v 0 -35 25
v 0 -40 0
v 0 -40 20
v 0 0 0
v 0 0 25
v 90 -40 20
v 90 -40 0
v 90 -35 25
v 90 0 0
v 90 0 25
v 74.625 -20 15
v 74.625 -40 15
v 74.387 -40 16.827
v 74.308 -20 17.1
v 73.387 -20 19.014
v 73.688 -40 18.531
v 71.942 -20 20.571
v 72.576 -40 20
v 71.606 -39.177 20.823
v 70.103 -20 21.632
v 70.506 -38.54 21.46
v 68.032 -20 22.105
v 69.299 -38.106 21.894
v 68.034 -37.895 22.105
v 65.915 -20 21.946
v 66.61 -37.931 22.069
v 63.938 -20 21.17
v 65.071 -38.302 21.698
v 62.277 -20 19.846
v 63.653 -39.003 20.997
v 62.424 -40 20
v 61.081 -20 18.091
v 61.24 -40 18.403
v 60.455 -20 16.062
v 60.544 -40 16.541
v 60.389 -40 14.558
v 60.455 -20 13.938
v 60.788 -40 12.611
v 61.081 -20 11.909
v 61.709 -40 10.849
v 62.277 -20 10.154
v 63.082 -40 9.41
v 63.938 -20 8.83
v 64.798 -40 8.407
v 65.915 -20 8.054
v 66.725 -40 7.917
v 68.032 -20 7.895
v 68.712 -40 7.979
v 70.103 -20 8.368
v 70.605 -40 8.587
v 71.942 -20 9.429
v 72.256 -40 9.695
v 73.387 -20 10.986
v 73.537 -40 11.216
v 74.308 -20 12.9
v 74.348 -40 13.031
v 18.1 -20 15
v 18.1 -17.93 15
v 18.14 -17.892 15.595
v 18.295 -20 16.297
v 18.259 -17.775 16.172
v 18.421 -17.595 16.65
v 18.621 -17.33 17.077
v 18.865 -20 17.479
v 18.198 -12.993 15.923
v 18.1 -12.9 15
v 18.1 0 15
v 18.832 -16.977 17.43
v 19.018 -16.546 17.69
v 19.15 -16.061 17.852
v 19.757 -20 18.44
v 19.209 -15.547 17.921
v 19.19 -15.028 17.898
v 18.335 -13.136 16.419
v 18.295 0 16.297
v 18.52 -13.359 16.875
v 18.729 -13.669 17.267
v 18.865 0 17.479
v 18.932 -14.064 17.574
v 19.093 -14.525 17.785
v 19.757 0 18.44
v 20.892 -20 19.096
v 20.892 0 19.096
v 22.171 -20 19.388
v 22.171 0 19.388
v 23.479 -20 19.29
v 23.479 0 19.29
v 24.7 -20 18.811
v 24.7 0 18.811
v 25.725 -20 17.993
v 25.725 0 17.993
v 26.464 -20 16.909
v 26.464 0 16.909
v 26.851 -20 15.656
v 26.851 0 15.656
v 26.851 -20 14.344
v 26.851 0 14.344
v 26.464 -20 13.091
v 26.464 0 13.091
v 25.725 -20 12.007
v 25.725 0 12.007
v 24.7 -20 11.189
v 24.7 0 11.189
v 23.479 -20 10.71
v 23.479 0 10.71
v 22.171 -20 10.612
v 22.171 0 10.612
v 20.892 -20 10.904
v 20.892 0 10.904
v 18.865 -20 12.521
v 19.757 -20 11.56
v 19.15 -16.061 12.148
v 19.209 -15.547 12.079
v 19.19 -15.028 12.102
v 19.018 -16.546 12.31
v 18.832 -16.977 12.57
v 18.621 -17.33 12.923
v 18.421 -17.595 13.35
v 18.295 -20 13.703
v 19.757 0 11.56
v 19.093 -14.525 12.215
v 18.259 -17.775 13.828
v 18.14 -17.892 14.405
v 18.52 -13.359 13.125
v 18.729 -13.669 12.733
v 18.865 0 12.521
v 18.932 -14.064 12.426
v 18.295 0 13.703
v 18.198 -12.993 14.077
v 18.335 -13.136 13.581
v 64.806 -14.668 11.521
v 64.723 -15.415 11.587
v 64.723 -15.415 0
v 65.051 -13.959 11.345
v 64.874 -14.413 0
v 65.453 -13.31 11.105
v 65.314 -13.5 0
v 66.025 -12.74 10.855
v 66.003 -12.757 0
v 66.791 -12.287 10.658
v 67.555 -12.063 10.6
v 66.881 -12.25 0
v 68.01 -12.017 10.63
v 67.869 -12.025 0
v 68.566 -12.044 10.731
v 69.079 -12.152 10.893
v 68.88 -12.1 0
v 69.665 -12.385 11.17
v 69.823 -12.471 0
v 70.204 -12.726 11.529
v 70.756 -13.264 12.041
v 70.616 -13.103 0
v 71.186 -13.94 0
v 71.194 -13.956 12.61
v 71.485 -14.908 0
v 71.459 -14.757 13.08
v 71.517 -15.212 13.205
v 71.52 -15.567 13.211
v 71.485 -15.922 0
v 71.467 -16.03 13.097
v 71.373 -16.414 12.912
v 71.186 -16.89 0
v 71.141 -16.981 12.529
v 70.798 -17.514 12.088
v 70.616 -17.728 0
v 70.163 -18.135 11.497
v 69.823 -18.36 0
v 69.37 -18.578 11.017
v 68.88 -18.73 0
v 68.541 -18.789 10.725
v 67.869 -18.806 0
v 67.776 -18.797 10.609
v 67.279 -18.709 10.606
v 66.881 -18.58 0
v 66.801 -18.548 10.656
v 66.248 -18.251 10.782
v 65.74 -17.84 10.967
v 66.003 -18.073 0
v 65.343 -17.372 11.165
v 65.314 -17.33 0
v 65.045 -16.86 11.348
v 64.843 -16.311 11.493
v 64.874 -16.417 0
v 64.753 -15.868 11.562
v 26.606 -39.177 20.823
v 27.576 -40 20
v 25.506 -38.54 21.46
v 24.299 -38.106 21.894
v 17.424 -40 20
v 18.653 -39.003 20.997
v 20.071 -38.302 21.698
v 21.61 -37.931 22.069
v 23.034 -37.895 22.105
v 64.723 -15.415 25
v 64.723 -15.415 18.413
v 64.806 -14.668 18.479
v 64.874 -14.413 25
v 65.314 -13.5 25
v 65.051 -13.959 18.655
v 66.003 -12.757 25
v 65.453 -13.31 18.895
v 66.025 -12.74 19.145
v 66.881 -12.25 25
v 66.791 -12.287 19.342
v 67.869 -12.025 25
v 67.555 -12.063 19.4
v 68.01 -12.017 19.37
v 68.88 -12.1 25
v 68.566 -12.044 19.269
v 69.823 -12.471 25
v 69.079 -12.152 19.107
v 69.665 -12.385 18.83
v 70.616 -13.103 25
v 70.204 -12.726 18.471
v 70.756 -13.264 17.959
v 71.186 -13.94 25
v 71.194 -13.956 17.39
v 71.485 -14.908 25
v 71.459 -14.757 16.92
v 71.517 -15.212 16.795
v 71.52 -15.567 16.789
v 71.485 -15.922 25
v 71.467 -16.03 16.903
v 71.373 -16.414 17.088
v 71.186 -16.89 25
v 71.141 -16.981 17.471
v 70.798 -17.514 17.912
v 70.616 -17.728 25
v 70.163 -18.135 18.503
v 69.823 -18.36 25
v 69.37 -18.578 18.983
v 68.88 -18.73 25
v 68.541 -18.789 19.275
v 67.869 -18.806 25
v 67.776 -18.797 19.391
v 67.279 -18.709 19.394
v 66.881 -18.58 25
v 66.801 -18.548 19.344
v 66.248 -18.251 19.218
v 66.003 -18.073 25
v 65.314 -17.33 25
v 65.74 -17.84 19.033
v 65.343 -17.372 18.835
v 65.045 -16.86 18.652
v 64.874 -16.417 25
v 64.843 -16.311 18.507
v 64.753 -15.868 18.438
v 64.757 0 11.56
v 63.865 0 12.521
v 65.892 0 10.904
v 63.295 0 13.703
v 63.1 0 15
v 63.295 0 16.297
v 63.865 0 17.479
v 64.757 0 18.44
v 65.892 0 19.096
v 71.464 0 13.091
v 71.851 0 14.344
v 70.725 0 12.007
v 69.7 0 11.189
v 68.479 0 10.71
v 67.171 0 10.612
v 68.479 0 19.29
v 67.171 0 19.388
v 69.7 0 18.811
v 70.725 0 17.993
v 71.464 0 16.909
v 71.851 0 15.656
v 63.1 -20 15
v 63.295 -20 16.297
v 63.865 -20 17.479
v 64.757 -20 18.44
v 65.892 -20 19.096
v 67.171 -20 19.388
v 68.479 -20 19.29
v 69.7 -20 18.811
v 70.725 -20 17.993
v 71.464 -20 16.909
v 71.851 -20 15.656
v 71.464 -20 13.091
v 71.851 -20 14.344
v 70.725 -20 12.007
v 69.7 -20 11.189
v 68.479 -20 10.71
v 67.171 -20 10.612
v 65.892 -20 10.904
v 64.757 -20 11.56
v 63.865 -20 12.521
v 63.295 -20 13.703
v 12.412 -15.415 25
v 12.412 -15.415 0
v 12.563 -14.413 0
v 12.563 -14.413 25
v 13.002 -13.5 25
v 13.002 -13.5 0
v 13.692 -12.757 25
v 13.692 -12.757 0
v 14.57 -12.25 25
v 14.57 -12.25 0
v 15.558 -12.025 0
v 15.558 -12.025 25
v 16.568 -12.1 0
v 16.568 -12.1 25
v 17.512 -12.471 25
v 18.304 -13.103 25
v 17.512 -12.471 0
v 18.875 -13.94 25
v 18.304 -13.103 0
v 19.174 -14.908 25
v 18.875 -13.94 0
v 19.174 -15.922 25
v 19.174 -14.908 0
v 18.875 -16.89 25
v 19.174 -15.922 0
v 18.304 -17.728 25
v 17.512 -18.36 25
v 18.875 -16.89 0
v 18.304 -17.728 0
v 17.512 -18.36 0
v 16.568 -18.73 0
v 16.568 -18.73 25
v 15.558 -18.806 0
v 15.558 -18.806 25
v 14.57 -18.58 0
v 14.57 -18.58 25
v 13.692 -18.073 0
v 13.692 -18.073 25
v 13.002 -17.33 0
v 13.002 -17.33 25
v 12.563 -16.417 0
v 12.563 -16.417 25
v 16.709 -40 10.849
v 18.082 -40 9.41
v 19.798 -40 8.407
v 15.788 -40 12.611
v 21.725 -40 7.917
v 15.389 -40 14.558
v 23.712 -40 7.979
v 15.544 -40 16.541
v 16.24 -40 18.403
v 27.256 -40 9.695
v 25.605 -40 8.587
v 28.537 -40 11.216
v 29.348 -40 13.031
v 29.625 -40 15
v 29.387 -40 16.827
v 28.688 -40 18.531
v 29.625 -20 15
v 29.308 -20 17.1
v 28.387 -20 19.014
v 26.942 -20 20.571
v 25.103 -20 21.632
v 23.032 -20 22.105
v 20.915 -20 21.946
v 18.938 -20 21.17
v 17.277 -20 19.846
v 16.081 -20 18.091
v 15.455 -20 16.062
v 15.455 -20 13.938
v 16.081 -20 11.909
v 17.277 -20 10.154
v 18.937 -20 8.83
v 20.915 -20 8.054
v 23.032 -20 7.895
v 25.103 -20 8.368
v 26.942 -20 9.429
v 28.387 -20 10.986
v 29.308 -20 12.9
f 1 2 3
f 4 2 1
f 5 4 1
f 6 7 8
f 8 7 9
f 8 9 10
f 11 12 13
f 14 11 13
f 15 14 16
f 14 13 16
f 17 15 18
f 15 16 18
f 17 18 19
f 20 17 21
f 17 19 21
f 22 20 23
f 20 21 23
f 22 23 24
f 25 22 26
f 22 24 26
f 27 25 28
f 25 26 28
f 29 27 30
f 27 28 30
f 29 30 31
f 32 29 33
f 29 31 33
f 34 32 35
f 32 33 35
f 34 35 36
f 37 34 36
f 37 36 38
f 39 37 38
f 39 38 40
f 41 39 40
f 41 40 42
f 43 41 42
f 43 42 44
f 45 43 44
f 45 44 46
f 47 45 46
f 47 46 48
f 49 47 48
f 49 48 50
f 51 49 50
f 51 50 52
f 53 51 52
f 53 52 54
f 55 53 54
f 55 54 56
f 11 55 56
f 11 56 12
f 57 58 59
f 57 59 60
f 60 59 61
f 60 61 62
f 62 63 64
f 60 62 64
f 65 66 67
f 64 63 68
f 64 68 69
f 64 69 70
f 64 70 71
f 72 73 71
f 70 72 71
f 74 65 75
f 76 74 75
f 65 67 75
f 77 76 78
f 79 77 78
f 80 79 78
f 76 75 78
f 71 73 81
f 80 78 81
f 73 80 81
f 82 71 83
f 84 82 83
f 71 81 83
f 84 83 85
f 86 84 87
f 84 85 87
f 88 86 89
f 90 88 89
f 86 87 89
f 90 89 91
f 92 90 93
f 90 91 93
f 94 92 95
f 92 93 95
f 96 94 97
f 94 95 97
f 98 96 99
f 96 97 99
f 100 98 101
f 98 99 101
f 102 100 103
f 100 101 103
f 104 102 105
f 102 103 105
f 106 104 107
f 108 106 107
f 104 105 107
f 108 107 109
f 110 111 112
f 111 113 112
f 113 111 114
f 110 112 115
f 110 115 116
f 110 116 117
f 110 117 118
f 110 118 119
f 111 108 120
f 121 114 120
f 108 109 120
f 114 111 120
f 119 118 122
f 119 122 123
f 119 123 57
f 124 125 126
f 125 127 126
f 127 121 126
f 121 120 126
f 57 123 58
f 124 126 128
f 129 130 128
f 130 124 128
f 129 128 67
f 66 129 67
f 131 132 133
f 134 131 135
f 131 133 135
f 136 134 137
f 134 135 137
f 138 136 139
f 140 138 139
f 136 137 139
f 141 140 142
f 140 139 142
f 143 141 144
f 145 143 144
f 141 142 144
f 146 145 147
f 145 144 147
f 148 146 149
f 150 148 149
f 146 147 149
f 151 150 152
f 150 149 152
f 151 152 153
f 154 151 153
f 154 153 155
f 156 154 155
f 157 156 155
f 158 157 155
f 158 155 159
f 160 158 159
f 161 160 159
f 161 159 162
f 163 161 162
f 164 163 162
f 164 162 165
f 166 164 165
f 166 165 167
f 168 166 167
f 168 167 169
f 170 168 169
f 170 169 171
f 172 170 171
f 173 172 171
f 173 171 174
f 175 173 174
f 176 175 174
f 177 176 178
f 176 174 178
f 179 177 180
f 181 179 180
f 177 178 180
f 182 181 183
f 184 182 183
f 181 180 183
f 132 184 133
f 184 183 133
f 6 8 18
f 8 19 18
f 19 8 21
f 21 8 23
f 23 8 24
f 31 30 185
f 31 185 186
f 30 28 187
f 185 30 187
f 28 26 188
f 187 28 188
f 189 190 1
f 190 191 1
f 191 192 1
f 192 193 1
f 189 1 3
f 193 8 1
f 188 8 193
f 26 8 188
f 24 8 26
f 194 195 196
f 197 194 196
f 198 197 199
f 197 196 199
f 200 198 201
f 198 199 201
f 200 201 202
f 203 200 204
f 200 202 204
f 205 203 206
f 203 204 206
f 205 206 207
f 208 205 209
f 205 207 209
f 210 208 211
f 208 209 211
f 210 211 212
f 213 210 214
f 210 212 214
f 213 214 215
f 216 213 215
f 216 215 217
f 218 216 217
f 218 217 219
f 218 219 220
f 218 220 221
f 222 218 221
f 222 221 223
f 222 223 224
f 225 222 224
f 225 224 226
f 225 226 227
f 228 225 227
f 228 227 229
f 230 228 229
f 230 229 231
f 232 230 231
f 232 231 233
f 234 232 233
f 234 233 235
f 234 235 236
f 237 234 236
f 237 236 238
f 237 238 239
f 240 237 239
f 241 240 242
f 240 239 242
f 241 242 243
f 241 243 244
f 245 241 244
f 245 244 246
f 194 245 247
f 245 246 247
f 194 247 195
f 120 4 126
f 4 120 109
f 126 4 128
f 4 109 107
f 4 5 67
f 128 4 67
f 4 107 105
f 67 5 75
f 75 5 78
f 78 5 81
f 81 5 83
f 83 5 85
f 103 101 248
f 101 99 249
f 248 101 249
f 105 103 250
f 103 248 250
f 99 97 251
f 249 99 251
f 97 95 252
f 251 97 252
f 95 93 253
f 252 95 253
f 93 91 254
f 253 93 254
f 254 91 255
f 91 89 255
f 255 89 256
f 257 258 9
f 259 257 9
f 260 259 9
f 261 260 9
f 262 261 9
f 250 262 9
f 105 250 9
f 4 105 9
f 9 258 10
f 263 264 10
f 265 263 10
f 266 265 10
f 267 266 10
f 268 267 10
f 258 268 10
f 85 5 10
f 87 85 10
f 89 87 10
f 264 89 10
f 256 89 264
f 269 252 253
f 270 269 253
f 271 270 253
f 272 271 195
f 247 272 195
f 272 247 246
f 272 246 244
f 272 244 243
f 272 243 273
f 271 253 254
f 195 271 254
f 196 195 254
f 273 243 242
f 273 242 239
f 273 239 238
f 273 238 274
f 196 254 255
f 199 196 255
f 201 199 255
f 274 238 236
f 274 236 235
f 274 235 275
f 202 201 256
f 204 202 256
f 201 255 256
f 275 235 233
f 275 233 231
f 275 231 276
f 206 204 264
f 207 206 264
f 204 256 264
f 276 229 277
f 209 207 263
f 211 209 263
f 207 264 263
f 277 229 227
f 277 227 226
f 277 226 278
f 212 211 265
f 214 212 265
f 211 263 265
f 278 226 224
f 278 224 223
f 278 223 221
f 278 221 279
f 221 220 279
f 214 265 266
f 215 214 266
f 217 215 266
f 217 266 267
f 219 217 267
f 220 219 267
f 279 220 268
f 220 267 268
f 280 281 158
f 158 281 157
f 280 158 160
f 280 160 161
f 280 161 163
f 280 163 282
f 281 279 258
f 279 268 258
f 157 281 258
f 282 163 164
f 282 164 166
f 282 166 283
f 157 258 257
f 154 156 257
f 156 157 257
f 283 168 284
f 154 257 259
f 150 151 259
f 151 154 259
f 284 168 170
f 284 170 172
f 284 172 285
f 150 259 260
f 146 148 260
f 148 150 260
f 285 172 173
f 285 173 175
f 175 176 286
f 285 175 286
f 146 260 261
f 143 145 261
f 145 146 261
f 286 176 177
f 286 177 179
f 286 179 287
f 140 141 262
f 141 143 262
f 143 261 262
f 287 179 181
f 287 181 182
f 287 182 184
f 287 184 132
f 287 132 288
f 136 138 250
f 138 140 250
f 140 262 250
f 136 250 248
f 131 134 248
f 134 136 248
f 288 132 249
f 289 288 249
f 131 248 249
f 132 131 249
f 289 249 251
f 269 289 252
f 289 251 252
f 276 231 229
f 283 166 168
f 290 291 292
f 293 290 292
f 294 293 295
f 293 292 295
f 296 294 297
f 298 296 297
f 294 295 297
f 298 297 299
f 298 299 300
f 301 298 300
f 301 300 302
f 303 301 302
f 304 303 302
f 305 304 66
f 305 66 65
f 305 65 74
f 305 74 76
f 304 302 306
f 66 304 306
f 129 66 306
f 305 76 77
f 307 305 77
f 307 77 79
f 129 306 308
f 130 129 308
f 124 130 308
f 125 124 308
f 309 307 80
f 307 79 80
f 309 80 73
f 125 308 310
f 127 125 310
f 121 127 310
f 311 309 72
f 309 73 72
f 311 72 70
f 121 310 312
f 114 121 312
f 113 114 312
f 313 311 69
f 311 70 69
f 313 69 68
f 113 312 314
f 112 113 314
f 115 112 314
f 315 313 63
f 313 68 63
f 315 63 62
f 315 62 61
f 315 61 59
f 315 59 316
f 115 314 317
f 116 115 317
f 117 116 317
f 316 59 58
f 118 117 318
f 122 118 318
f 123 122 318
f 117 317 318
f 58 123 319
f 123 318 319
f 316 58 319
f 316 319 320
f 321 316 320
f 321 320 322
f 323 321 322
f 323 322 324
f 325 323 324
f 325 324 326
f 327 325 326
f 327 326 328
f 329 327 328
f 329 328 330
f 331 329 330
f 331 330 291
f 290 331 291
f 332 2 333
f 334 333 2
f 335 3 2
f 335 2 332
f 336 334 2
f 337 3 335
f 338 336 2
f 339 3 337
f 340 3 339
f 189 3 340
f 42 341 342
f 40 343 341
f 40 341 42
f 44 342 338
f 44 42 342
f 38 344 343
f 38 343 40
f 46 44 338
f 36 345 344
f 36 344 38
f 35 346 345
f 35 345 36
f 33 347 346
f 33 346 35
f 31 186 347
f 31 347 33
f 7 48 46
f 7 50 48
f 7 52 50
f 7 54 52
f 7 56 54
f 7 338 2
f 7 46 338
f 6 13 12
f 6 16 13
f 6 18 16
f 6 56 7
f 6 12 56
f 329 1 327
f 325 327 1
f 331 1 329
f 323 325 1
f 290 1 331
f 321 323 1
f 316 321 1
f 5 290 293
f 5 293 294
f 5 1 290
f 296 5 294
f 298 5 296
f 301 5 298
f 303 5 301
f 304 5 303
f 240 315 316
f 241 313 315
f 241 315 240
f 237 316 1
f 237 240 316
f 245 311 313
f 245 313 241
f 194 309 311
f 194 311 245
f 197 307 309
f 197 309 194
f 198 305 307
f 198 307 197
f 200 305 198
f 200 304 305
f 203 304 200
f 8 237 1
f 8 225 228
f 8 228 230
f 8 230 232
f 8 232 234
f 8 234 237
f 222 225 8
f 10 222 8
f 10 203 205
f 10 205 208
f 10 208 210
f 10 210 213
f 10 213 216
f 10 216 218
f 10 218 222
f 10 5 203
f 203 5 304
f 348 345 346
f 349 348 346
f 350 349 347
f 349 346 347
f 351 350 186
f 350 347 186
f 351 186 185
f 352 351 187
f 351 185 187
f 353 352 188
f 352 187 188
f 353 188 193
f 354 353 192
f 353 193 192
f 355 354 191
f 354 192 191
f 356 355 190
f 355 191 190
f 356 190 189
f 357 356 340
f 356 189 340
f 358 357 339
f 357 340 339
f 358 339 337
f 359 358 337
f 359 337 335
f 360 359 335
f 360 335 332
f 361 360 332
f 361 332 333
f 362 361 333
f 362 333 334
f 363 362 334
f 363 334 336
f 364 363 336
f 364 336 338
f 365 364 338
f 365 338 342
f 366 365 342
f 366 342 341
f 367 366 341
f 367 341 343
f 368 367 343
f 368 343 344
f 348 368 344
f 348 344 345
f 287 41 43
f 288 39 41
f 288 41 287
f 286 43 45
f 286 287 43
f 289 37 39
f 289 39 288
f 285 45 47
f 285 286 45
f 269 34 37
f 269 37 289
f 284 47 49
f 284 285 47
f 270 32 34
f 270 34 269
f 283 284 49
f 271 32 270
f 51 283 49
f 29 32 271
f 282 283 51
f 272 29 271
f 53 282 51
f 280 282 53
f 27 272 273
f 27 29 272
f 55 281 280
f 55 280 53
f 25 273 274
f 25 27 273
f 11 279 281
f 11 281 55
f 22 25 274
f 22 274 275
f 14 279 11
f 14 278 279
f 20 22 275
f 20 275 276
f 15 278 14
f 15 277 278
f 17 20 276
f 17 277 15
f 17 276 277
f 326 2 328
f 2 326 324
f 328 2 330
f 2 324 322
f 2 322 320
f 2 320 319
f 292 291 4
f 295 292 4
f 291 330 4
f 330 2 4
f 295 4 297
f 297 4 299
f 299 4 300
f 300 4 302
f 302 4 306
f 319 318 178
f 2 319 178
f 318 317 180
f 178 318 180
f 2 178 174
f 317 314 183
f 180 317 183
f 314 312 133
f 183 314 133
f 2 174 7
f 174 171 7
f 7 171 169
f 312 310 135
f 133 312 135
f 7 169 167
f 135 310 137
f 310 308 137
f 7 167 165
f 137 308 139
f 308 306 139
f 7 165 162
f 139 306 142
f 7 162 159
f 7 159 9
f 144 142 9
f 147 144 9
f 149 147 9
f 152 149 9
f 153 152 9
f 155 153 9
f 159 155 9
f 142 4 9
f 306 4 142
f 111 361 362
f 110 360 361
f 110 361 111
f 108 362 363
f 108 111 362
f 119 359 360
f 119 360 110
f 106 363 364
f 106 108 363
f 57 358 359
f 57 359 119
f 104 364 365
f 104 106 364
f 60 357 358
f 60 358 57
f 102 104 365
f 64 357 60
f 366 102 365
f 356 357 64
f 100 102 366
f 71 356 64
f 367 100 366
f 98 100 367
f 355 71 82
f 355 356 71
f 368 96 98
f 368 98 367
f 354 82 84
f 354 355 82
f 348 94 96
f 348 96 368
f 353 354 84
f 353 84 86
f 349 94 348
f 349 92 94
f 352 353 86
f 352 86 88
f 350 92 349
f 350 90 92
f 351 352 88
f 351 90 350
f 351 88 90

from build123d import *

# Parameters (mm, degrees)
F0_W           = 90
F0_H           = 25
F1_DEPTH       = 40
F3_D           = 8.8
F3_CBORE_D     = 14.25
F3_CBORE_DEPTH = 20
F4_T1_DEPTH    = 115.7168298797
F6_D           = 6.8


# Not quite as in the source:
# - a fillet or chamfer that OpenCascade refuses, or shapes differently, is made with other operations: its cross-section is extruded or revolved along the edge and cut away or added


with BuildPart() as f1:
    # F0 (on Front) → F1 (new body)
    with BuildSketch(Plane.XZ):
        with Locations((45, 12.5)):
            Rectangle(F0_W, F0_H)
    extrude(amount=F1_DEPTH)

    # F3 (through all)
    with Locations(Plane.XZ.offset(40)):
        with Locations((22.5, 15), (67.5, 15)):
            CounterBoreHole(F3_D / 2, F3_CBORE_D / 2, F3_CBORE_DEPTH)

    # F4: chamfer of 5 on 1 edges, made by hand

    # F4_s2 → F4_t1 (cut)
    with BuildSketch(Plane.YZ.offset(-12.8584149398)):
        Polygon((-35, 25), (-40, 20), (-40, 25), align=None)
    extrude(amount=F4_T1_DEPTH, mode=Mode.SUBTRACT)

    # F6 (through all)
    with Locations(Plane.XY.offset(25)):
        with Locations((15.8117040992, -15.4151152819), (68.1231990457, -15.4151152819)):
            Hole(F6_D / 2)


solid = f1.part
